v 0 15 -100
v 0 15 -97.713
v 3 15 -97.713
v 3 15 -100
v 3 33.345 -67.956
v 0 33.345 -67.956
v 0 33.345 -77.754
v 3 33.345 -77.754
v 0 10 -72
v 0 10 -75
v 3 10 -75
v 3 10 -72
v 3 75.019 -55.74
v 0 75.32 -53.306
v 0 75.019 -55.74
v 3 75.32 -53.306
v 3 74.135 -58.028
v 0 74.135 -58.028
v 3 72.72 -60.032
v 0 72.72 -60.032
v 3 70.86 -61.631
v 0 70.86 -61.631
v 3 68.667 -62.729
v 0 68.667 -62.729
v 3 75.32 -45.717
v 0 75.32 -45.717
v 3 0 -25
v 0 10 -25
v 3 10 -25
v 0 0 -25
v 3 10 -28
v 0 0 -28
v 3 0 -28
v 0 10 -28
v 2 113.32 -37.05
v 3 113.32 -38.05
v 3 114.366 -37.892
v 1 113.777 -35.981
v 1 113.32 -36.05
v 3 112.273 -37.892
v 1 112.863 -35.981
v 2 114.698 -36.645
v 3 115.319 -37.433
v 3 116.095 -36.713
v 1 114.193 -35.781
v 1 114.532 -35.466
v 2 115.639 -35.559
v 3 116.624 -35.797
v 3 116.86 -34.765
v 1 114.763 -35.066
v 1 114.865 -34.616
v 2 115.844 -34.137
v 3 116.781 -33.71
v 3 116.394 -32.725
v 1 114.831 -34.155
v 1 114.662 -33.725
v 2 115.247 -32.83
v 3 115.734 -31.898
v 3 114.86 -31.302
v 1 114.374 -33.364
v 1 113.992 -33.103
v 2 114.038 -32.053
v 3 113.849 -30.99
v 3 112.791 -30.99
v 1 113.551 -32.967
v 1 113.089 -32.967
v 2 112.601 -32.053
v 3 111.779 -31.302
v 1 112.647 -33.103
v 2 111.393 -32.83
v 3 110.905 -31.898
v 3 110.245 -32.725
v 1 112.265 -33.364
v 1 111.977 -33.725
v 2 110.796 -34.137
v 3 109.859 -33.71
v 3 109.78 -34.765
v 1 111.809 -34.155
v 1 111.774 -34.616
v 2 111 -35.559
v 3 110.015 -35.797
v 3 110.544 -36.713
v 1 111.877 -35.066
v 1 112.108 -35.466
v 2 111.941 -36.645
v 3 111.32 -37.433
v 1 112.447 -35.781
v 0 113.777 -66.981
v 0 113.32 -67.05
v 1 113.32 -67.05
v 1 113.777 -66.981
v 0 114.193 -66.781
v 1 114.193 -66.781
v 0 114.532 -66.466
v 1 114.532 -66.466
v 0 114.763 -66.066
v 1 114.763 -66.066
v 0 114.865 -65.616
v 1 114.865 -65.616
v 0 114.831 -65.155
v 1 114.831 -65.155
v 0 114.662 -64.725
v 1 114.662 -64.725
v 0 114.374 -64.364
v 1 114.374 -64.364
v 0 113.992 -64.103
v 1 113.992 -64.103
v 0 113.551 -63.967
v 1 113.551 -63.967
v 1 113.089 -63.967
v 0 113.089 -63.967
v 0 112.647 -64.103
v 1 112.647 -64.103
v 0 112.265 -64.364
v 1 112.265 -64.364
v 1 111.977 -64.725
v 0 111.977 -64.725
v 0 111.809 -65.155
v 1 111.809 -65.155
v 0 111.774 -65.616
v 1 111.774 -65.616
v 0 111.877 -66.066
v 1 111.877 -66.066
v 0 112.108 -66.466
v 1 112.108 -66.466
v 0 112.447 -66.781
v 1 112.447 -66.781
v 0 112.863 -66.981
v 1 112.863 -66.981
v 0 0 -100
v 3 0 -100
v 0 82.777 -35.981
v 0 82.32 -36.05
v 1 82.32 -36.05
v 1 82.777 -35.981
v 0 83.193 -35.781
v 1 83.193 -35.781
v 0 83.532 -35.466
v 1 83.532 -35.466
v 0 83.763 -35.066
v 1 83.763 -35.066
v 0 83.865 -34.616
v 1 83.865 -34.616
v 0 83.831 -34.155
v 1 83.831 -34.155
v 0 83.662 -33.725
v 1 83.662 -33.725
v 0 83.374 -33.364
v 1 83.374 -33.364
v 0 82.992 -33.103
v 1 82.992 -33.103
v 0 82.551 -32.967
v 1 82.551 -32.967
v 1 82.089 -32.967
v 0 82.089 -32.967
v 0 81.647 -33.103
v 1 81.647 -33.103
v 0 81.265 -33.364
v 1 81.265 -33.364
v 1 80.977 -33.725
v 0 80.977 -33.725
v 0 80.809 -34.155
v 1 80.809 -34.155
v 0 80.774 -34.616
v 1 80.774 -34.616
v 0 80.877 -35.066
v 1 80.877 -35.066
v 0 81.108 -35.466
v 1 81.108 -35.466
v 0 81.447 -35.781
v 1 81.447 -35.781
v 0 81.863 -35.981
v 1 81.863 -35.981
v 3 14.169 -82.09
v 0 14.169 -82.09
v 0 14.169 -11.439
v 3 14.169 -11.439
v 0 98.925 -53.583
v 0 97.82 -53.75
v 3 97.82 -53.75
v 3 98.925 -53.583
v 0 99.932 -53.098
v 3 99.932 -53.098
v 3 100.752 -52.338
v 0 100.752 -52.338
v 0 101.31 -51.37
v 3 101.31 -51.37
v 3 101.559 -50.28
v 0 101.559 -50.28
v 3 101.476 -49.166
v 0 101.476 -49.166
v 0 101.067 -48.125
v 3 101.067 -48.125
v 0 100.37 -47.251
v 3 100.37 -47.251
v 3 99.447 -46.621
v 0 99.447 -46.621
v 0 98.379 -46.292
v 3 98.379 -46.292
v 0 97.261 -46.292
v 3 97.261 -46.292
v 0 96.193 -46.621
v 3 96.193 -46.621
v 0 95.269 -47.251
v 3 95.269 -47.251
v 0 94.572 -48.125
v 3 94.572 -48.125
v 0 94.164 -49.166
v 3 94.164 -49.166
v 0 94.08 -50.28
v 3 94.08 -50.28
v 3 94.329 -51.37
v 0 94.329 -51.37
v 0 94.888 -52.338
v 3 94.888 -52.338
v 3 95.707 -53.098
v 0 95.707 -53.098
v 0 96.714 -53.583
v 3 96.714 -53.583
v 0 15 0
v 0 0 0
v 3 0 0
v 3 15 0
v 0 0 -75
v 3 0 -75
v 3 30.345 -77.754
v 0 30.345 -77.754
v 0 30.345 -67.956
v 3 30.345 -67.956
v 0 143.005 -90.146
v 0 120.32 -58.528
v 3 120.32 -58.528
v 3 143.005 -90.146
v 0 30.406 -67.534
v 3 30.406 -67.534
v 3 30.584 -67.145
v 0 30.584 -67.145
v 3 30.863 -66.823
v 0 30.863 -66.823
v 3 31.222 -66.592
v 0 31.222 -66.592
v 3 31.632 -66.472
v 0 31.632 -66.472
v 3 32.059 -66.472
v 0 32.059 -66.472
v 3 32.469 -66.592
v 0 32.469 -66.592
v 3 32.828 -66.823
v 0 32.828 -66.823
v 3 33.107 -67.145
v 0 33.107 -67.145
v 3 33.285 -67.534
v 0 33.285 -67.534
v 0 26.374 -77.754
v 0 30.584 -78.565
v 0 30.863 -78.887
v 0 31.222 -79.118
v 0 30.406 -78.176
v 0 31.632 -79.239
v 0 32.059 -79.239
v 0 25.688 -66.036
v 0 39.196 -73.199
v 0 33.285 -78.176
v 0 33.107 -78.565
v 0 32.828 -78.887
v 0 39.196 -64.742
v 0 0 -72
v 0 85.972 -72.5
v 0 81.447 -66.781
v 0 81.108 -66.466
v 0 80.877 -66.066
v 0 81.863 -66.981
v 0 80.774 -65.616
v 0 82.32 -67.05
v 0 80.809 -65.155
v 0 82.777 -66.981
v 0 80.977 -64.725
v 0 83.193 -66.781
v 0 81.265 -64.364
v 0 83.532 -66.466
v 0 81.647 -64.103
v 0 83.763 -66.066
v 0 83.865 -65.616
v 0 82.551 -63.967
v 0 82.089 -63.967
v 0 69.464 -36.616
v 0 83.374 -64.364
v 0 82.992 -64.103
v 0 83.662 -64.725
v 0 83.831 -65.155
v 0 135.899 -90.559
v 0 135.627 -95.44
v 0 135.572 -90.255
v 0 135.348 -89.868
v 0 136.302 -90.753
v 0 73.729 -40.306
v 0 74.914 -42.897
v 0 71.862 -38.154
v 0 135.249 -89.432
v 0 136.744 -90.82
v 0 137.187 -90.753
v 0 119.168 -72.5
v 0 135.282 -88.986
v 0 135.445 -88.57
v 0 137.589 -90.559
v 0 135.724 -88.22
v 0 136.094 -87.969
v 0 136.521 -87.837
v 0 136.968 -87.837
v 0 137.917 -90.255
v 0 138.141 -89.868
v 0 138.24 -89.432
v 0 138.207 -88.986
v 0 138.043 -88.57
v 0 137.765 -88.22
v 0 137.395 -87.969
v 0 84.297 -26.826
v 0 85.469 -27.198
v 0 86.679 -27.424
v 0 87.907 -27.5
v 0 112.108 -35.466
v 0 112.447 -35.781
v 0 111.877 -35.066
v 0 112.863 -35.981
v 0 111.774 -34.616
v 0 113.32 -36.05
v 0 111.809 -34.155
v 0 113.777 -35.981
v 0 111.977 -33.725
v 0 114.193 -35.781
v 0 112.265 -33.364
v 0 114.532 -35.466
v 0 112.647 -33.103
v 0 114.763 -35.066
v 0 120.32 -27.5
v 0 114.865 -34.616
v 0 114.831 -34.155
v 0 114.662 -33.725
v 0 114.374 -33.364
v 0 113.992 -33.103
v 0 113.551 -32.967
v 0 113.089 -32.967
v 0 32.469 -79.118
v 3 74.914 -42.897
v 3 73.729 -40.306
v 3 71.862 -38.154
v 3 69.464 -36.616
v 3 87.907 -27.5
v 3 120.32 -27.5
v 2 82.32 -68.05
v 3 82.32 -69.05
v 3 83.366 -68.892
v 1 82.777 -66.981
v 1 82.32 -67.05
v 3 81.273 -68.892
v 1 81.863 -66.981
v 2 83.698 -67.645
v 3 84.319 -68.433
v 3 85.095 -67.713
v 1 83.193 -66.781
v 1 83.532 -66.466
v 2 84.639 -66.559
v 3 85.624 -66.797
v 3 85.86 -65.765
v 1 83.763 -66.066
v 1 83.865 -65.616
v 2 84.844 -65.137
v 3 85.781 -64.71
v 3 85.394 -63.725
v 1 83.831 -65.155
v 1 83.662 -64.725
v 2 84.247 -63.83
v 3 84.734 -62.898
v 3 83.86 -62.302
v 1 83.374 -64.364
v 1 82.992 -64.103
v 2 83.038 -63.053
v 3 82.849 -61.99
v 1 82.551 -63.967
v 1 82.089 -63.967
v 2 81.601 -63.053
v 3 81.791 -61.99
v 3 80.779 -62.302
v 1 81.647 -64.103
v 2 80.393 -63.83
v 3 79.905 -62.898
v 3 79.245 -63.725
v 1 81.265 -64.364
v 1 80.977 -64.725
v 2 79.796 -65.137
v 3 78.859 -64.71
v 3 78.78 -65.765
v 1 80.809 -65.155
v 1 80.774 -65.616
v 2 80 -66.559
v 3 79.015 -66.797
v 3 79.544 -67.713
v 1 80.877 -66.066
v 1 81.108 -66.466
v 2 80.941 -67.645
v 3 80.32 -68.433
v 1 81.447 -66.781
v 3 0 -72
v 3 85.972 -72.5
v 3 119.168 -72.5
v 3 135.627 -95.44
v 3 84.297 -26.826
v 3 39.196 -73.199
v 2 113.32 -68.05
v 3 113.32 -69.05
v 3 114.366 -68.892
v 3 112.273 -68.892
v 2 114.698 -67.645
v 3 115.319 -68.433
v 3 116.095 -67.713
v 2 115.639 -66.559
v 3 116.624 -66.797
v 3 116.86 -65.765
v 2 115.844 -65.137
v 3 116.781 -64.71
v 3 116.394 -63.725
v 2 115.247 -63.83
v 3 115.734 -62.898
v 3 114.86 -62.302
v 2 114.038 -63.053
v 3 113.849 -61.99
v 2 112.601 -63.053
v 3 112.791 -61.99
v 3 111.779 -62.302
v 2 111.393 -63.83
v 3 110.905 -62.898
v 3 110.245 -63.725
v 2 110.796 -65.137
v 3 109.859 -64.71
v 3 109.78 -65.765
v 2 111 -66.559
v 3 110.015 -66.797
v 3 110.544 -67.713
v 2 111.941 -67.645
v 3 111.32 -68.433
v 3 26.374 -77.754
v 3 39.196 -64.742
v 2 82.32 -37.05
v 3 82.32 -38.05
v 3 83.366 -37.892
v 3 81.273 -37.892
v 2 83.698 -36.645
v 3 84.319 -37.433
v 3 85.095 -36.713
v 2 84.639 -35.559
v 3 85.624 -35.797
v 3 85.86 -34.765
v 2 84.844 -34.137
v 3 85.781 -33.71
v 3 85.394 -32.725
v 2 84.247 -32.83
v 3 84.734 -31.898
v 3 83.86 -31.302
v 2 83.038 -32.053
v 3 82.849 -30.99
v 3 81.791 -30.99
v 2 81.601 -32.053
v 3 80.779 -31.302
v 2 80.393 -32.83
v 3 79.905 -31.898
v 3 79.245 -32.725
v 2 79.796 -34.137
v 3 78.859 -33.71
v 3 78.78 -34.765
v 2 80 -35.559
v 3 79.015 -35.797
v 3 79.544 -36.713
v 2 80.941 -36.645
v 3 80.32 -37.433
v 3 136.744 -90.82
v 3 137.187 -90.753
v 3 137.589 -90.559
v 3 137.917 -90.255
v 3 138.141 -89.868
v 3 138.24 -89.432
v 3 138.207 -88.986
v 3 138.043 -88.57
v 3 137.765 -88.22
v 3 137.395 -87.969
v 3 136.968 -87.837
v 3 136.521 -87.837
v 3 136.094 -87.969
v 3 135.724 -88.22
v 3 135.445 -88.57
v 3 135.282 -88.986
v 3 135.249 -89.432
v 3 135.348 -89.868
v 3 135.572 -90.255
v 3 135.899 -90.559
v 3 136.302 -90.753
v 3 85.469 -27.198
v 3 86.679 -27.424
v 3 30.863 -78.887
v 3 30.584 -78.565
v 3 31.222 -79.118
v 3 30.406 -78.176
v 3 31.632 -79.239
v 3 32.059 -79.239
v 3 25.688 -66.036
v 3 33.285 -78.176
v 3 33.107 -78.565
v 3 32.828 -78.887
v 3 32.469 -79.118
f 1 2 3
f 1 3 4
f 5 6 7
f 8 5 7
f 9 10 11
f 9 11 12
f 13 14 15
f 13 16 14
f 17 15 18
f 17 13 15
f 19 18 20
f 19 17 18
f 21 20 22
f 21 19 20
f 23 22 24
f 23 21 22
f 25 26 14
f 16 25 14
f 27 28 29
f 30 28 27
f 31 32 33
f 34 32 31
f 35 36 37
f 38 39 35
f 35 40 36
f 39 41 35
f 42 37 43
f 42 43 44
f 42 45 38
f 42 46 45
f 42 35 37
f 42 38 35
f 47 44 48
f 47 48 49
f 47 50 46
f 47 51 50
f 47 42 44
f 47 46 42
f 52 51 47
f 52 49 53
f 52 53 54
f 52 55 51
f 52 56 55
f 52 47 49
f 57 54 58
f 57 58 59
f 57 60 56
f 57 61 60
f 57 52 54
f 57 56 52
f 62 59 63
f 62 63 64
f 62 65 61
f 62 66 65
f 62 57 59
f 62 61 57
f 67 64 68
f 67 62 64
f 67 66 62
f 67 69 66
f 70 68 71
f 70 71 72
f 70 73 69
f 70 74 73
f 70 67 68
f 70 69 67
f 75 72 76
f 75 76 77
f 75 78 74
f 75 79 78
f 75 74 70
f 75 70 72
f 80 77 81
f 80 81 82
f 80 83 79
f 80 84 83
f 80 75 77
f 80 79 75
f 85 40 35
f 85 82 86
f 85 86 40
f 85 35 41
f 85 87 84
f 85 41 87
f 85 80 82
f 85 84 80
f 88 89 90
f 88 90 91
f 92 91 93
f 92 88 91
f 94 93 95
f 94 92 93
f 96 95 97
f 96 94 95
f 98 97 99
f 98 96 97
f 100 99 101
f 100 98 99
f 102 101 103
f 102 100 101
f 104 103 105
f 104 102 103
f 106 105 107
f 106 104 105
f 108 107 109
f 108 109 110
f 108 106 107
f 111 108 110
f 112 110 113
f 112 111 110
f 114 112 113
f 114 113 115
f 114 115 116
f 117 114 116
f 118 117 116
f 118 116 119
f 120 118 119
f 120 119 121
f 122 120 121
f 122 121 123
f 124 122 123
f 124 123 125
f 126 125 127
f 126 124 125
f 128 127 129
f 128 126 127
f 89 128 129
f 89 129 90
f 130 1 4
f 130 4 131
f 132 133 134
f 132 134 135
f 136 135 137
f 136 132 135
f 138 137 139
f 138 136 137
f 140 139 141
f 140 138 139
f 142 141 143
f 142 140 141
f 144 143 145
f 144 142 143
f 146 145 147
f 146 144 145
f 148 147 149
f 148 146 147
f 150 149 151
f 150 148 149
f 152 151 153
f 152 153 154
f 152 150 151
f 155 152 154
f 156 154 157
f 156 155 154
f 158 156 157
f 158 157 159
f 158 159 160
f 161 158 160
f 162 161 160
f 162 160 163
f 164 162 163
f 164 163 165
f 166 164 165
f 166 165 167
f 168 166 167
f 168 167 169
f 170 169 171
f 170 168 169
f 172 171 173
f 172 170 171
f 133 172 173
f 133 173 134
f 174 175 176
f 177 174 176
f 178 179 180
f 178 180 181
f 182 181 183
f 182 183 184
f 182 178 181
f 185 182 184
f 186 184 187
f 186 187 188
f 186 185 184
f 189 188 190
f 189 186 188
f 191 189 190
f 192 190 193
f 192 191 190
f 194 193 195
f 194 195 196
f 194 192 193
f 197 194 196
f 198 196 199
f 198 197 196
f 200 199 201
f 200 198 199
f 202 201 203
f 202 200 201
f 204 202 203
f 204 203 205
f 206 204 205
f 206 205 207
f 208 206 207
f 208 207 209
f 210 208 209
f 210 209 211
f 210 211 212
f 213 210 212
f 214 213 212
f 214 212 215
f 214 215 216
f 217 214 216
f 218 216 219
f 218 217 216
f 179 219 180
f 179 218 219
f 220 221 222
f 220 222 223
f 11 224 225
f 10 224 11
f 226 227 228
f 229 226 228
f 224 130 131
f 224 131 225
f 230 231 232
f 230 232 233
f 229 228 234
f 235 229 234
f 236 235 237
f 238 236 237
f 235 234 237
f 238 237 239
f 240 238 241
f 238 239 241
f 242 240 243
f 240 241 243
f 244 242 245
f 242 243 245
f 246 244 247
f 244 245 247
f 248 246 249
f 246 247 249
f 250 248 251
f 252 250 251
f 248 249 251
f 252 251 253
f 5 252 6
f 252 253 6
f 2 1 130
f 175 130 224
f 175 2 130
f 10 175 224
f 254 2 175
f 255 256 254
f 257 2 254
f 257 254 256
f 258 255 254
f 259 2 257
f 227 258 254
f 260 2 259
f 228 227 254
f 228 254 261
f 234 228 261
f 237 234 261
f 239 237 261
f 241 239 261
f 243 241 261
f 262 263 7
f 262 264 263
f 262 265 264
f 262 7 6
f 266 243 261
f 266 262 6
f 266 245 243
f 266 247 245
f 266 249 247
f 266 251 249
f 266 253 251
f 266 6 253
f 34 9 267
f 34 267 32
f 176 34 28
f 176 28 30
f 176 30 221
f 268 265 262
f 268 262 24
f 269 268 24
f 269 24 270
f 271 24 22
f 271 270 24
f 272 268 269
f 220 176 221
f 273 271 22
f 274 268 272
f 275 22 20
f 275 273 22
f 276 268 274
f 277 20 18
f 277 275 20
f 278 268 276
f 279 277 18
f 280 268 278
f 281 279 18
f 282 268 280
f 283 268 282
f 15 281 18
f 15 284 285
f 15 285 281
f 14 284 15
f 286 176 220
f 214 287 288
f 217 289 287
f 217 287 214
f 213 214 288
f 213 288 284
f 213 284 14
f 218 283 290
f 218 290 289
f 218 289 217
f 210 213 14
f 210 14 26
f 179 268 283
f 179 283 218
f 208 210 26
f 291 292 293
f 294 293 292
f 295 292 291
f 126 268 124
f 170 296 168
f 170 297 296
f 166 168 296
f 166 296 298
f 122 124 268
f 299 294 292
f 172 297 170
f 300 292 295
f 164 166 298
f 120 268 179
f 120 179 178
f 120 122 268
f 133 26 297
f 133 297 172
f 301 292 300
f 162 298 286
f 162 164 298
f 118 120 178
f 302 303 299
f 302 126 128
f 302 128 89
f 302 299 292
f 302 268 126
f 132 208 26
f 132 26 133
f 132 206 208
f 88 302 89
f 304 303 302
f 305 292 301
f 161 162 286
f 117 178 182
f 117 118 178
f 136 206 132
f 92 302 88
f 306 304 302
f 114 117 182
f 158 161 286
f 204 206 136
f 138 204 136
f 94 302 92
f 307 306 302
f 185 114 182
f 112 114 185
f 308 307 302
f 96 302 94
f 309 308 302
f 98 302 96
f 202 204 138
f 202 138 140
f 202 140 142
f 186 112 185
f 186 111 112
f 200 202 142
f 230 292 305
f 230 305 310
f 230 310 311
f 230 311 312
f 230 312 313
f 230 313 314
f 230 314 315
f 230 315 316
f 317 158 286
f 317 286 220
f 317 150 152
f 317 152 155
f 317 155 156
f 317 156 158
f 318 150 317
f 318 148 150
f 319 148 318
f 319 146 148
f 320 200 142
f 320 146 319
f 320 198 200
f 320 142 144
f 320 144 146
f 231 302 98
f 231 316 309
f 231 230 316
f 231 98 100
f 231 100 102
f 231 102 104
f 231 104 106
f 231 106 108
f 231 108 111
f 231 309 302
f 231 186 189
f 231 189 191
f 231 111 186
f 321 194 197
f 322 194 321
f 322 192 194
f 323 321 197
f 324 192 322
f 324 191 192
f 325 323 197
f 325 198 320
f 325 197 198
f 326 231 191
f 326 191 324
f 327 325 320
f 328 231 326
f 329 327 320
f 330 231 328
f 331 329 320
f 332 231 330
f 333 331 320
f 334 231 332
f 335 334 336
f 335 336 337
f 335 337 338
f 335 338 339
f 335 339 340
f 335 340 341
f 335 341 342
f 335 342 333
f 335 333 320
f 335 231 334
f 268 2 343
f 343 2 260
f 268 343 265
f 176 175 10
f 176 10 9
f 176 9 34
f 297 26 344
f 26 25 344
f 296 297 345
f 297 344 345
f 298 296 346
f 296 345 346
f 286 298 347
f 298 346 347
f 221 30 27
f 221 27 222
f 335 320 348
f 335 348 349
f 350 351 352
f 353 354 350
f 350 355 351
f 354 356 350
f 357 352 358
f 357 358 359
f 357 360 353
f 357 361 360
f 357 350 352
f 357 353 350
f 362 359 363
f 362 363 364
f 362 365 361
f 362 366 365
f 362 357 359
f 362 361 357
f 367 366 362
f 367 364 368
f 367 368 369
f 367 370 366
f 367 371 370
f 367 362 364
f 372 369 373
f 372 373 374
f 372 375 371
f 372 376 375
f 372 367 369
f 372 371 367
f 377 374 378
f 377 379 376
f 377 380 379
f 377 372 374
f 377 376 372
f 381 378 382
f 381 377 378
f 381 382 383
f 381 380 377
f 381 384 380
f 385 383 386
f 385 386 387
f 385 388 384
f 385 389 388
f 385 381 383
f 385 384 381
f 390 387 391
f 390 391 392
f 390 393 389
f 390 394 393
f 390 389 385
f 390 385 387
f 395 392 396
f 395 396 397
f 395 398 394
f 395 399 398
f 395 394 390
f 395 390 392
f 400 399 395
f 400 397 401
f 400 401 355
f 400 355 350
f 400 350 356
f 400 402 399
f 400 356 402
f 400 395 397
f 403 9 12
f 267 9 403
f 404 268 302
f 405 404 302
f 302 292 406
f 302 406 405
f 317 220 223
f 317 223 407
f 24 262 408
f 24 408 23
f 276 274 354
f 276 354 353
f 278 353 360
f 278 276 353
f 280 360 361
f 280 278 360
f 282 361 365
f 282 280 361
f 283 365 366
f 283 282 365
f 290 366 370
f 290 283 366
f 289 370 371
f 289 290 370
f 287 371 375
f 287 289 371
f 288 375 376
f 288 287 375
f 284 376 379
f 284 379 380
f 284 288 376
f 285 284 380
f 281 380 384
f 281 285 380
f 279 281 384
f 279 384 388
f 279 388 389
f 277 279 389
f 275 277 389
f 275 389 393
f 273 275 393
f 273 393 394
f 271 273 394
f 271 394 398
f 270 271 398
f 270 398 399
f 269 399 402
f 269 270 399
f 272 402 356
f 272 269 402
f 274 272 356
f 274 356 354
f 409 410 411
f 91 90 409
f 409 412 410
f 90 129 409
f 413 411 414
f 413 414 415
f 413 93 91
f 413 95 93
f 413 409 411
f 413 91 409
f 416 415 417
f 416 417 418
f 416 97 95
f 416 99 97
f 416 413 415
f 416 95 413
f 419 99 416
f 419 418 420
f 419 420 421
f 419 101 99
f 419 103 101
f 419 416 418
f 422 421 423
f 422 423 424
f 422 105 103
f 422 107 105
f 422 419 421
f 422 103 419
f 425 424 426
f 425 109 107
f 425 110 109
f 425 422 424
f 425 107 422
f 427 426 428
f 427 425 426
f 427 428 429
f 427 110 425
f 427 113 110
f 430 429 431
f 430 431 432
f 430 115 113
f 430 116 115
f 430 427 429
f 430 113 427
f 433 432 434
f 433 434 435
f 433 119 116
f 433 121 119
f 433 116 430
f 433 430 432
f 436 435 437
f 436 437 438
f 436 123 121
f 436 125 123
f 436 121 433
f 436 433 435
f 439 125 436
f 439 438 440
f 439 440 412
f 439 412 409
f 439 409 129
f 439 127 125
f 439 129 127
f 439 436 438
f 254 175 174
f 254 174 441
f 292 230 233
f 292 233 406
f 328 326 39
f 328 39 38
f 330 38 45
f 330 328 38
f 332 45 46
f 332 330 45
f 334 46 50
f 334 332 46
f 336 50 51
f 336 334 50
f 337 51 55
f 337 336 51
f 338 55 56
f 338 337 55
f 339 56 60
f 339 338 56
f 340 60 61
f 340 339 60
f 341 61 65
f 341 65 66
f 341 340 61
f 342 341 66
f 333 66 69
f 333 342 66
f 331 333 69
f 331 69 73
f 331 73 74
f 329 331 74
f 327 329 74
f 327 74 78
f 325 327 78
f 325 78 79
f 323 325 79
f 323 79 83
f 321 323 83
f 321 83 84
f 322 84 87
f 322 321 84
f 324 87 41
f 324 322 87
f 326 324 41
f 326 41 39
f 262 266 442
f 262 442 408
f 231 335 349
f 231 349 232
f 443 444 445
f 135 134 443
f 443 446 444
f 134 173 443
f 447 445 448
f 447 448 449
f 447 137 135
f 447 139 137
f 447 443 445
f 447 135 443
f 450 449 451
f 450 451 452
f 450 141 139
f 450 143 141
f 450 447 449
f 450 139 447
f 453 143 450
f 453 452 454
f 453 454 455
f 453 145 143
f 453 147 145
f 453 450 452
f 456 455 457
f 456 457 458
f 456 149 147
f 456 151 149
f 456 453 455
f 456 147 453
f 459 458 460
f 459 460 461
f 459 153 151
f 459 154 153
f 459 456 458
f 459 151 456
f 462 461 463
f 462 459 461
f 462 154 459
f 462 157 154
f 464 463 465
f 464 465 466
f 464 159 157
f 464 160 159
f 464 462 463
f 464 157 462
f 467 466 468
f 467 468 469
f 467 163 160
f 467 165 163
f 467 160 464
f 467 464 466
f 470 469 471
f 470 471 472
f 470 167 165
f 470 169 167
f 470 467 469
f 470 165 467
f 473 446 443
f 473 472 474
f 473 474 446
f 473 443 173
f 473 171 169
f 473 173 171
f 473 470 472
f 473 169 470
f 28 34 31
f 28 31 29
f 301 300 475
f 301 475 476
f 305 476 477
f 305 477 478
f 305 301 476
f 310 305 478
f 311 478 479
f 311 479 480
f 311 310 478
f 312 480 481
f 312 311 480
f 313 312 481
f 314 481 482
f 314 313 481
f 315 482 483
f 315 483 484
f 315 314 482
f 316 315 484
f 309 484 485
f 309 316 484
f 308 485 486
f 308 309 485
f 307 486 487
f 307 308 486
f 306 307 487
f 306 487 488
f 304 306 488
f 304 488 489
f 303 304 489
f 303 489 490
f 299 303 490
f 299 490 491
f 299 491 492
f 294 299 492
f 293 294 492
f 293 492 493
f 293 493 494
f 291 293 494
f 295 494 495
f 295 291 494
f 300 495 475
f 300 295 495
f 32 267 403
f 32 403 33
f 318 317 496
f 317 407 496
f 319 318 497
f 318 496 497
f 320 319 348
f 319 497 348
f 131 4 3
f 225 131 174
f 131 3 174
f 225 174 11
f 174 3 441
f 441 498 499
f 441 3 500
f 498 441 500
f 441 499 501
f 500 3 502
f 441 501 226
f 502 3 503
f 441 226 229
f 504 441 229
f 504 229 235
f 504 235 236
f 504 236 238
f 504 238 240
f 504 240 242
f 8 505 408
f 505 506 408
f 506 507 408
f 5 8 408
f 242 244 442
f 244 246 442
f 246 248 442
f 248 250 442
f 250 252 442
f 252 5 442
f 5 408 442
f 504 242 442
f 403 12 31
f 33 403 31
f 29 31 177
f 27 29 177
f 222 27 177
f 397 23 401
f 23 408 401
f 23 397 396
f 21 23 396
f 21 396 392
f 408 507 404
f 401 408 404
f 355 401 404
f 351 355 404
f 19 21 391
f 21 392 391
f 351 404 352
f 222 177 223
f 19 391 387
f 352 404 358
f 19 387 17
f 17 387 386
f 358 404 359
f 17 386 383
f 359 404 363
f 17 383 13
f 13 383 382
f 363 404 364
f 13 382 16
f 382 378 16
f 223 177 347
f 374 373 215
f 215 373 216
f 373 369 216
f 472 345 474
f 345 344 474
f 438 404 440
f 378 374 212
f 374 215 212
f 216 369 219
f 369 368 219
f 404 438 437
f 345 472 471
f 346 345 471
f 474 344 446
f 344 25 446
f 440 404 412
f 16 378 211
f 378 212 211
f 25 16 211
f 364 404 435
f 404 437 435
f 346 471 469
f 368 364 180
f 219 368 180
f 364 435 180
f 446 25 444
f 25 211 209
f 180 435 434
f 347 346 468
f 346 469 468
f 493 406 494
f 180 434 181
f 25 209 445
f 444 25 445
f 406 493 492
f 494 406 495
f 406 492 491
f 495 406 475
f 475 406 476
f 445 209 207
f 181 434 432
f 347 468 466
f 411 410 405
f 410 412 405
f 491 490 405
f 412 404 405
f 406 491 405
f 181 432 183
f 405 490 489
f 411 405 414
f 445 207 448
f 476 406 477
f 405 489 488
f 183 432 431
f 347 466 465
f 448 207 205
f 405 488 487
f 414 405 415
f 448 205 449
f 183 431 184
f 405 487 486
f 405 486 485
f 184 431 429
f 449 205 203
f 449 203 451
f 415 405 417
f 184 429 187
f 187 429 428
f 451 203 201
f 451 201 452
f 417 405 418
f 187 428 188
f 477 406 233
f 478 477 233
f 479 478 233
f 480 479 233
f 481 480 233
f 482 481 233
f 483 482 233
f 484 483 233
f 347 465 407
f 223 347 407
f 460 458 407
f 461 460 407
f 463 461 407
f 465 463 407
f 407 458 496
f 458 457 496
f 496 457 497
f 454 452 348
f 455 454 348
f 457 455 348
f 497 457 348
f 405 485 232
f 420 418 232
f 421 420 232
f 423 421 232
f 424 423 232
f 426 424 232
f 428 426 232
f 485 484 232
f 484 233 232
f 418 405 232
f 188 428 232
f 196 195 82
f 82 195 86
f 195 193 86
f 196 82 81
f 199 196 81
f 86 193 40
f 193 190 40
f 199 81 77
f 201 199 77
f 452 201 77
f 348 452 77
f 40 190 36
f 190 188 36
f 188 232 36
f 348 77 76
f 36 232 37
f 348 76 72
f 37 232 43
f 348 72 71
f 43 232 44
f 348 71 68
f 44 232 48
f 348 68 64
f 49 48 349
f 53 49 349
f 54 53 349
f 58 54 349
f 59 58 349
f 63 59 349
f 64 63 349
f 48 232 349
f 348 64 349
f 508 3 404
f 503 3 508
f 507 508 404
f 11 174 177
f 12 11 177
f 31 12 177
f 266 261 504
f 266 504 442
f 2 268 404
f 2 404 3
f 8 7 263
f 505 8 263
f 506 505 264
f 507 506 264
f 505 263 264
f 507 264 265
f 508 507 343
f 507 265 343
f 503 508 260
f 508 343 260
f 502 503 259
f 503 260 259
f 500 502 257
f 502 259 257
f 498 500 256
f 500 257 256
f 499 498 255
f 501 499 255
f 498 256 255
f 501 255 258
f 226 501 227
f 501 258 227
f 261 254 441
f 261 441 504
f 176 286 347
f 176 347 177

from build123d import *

# Parameters (mm, degrees)
SKETCH1_W           = 45
SKETCH1_H           = 45
SKETCH1_R           = 1.55
SKETCH1_R_2         = 3.75
SKETCH1_R_3         = 1.5
BOSS_EXTRUDE2_DEPTH = 3
CHAMFER1_SIZE       = 2
FILLET2_R           = 10


with BuildPart() as part:
    # Sketch1 → Boss-Extrude2 (new body)
    # profile 1 of 3: a face of its own
    with BuildSketch(Plane(origin=(0, 0, 0), x_dir=(0, 0, -1), z_dir=(1, 0, 0))):
        Polygon((0, 15), (27.5, 86.038878339), (39.282646226, 75.31968933), (11.439152216, 14.16907058), (50, 14.16907058), (82.089729195, 14.16907058), (77.753857358, 26.374167507), (66.036256754, 25.688126343), (64.741637437, 39.196033454), (73.198877763, 39.196033454), (60.365916003, 75.31968933), (72.5, 85.972228566), (97.712949054, 15), (100, 15), (100, 0), (75, 0), (75, 10), (72, 10), (72, 0), (28, 0), (28, 10), (25, 10), (25, 0), (0, 0), align=None)
        with BuildLine():
            Line((67.956429084, 33.345444875), (77.753857358, 33.345444875))
            ThreePointArc((77.753857358, 33.345444875), (79.253857358, 31.845444875), (77.753857358, 30.345444875))
            Line((77.753857358, 30.345444875), (67.956429084, 30.345444875))
            ThreePointArc((67.956429084, 30.345444875), (66.456429084, 31.845444875), (67.956429084, 33.345444875))
        make_face(mode=Mode.SUBTRACT)
    # profile 2 of 3: a face of its own
    with BuildSketch(Plane(origin=(0, 0, 0), x_dir=(0, 0, -1), z_dir=(1, 0, 0))):
        with Locations((50, 97.81968933)):
            Rectangle(SKETCH1_W, SKETCH1_H)
        with Locations((34.5, 82.31968933)):
            Circle(SKETCH1_R, mode=Mode.SUBTRACT)
        with Locations((65.5, 82.31968933)):
            Circle(SKETCH1_R, mode=Mode.SUBTRACT)
        with Locations((65.5, 113.31968933)):
            Circle(SKETCH1_R, mode=Mode.SUBTRACT)
        with Locations((34.5, 113.31968933)):
            Circle(SKETCH1_R, mode=Mode.SUBTRACT)
        with Locations((50, 97.81968933)):
            Circle(SKETCH1_R_2, mode=Mode.SUBTRACT)
    # profile 3 of 3: a face of its own
    with BuildSketch(Plane(origin=(0, 0, 0), x_dir=(0, 0, -1), z_dir=(1, 0, 0))):
        Polygon((58.527688318, 120.31968933), (90.14613276, 143.005488448), (95.440133744, 135.626948458), (68.383623973, 116.214274737), align=None)
        with Locations((89.319967142, 136.74442097)):
            Circle(SKETCH1_R_3, mode=Mode.SUBTRACT)
    extrude(amount=BOSS_EXTRUDE2_DEPTH)

    # Chamfer1
    chamfer1_edges = [part.edges().sort_by_distance(p)[0] for p in [
        (3, 82.31968933, -32.95),
        (3, 113.31968933, -32.95),
        (3, 113.31968933, -63.95),
        (3, 82.31968933, -63.95),
    ]]
    chamfer(chamfer1_edges, length=CHAMFER1_SIZE)

    # Fillet2
    fillet2_edges = [part.edges().sort_by_distance(p)[0] for p in [
        (1.5, 86.038878339, -27.5),
        (1.5, 75.31968933, -60.365916003),
        (1.5, 75.31968933, -39.282646226),
    ]]
    fillet(fillet2_edges, radius=FILLET2_R)


solid = part.part
